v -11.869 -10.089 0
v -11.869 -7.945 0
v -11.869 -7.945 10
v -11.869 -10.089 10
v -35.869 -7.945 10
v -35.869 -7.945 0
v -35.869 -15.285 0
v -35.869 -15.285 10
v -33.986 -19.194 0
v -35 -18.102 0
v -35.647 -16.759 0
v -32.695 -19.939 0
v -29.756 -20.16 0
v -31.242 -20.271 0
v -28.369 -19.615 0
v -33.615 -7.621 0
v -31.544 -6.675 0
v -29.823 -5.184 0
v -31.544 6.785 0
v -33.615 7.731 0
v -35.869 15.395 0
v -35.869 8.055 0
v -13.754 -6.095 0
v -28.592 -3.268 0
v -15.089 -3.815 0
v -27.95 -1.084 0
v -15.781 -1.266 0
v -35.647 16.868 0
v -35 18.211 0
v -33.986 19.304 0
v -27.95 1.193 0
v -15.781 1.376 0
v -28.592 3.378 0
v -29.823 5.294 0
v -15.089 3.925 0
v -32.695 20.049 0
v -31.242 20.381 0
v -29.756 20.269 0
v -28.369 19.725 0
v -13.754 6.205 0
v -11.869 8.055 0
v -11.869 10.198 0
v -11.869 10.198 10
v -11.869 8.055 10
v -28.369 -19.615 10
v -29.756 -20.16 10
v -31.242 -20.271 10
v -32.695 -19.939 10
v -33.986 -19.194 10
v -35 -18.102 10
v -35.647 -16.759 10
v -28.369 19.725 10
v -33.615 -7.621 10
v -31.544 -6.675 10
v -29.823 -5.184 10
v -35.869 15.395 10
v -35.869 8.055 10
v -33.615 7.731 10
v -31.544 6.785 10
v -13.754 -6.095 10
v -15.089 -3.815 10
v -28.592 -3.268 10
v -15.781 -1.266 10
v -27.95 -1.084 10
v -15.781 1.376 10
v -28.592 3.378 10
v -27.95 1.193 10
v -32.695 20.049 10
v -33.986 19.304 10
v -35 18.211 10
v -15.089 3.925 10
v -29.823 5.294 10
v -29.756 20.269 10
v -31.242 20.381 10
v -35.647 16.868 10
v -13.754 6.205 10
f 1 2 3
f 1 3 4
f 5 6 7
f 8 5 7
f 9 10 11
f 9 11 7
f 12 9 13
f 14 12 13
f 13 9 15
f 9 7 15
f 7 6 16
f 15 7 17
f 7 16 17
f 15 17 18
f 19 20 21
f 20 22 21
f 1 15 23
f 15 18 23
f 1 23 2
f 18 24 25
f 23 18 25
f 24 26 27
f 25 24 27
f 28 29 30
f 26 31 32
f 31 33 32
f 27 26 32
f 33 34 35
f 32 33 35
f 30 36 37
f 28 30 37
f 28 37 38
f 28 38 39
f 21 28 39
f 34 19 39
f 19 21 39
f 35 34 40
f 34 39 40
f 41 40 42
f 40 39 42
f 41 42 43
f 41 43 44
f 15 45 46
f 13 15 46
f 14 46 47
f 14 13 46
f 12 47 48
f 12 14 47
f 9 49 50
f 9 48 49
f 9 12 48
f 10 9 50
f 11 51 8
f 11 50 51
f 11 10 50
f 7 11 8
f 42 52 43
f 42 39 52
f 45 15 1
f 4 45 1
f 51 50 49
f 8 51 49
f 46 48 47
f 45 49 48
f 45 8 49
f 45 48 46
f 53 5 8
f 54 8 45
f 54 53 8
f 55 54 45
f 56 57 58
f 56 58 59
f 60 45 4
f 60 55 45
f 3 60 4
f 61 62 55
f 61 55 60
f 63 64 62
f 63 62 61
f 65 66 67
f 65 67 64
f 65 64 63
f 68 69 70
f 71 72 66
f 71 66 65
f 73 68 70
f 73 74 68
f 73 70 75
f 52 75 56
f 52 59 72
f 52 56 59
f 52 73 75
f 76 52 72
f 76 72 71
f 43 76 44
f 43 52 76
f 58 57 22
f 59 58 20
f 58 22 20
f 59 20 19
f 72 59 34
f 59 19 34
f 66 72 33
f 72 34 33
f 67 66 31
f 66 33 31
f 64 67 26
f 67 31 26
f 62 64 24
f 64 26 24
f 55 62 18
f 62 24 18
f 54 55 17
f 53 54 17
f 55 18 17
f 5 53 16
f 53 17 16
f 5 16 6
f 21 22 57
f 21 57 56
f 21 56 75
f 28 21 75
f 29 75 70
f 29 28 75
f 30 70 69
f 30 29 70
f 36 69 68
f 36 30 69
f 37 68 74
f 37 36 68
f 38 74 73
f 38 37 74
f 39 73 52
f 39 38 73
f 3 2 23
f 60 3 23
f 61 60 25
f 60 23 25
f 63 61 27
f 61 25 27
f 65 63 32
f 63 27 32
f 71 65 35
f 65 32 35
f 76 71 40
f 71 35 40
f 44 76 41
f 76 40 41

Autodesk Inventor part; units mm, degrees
ref_plane "YZ Plane" through (0, 0, 0) normal (1, 0, 0) x (0, 1, 0)
ref_plane "XZ Plane" through (0, 0, 0) normal (0, 1, 0) x (-1, 0, 0)
ref_plane "XY Plane" through (0, 0, 0) normal (0, 0, 1) x (1, 0, 0)
sketch "스케치1" plane through (0, 0, 0) normal (0, 0, 1) x (1, 0, 0)
  line L0 (-0.0808, 29.1134) -> (-0.0808, -34.3055)
  line L1 (-44.0255, 0.0549) -> (53.8558, 0.0549)
  line L2 (-35.8687, -7.9451) -> (-35.8687, -23.9451)
  line L3 (-35.8687, -23.9451) -> (-35.8687, 0.0549)
  line L4 (-35.8687, 8.0549) -> (-35.8687, 24.0549)
  line L5 (-35.8687, 24.0549) -> (5.7005, 0.0549)
  line L6 (-35.8687, -23.9451) -> (5.7005, 0.0549)
  arc A0 (-35.8687, -15.2849) -> (-28.3687, -19.615) centre (-30.8687, -15.2849) ccw
  arc A1 (-28.3687, 19.7248) -> (-35.8687, 15.3946) centre (-30.8687, 15.3946) ccw
  arc A2 (-35.8687, -7.9451) -> (-35.8687, 8.0549) centre (-35.8687, 0.0549) ccw
  line L7 (-15.8687, 16.9552) -> (-15.8687, -23.9451)
  arc A3 (-11.8687, 8.0549) -> (-11.8687, -7.9451) centre (-5.8687, 0.0549) ccw
  line L8 (-11.8687, 10.1985) -> (-11.8687, 8.0549)
  line L9 (-11.8687, -7.9451) -> (-11.8687, -10.0887)
  dimension "d7" = 24
  dimension "d8" = 24
  dimension "d9" = 60
  dimension "d10" = 10
  dimension "d11" = 10
  dimension "d12" = 16
  dimension "d14" = 20
sketch "스케치2" plane through (0, 0, 0) normal (0, 0, 1) x (1, 0, 0)
  point P0 (0, 0)
extrude "돌출1" add sketch "스케치1" along normal blind 10 contours L8 A3 L7 L5 | L7 L6 A0 L2 A2 L1 | L1 A2 L4 A1 L5 L7 | A3 L9 L6 L7
sketch "스케치3" plane through (0, 0, 10) normal (0, 0, 1) x (1, 0, 0)
  point P0 (0, 0)
sketch "스케치4" plane through (0, 0, 10) normal (0, 0, 1) x (1, 0, 0)
  point P0 (0, 0)
properties part number "240412_sketch3"
